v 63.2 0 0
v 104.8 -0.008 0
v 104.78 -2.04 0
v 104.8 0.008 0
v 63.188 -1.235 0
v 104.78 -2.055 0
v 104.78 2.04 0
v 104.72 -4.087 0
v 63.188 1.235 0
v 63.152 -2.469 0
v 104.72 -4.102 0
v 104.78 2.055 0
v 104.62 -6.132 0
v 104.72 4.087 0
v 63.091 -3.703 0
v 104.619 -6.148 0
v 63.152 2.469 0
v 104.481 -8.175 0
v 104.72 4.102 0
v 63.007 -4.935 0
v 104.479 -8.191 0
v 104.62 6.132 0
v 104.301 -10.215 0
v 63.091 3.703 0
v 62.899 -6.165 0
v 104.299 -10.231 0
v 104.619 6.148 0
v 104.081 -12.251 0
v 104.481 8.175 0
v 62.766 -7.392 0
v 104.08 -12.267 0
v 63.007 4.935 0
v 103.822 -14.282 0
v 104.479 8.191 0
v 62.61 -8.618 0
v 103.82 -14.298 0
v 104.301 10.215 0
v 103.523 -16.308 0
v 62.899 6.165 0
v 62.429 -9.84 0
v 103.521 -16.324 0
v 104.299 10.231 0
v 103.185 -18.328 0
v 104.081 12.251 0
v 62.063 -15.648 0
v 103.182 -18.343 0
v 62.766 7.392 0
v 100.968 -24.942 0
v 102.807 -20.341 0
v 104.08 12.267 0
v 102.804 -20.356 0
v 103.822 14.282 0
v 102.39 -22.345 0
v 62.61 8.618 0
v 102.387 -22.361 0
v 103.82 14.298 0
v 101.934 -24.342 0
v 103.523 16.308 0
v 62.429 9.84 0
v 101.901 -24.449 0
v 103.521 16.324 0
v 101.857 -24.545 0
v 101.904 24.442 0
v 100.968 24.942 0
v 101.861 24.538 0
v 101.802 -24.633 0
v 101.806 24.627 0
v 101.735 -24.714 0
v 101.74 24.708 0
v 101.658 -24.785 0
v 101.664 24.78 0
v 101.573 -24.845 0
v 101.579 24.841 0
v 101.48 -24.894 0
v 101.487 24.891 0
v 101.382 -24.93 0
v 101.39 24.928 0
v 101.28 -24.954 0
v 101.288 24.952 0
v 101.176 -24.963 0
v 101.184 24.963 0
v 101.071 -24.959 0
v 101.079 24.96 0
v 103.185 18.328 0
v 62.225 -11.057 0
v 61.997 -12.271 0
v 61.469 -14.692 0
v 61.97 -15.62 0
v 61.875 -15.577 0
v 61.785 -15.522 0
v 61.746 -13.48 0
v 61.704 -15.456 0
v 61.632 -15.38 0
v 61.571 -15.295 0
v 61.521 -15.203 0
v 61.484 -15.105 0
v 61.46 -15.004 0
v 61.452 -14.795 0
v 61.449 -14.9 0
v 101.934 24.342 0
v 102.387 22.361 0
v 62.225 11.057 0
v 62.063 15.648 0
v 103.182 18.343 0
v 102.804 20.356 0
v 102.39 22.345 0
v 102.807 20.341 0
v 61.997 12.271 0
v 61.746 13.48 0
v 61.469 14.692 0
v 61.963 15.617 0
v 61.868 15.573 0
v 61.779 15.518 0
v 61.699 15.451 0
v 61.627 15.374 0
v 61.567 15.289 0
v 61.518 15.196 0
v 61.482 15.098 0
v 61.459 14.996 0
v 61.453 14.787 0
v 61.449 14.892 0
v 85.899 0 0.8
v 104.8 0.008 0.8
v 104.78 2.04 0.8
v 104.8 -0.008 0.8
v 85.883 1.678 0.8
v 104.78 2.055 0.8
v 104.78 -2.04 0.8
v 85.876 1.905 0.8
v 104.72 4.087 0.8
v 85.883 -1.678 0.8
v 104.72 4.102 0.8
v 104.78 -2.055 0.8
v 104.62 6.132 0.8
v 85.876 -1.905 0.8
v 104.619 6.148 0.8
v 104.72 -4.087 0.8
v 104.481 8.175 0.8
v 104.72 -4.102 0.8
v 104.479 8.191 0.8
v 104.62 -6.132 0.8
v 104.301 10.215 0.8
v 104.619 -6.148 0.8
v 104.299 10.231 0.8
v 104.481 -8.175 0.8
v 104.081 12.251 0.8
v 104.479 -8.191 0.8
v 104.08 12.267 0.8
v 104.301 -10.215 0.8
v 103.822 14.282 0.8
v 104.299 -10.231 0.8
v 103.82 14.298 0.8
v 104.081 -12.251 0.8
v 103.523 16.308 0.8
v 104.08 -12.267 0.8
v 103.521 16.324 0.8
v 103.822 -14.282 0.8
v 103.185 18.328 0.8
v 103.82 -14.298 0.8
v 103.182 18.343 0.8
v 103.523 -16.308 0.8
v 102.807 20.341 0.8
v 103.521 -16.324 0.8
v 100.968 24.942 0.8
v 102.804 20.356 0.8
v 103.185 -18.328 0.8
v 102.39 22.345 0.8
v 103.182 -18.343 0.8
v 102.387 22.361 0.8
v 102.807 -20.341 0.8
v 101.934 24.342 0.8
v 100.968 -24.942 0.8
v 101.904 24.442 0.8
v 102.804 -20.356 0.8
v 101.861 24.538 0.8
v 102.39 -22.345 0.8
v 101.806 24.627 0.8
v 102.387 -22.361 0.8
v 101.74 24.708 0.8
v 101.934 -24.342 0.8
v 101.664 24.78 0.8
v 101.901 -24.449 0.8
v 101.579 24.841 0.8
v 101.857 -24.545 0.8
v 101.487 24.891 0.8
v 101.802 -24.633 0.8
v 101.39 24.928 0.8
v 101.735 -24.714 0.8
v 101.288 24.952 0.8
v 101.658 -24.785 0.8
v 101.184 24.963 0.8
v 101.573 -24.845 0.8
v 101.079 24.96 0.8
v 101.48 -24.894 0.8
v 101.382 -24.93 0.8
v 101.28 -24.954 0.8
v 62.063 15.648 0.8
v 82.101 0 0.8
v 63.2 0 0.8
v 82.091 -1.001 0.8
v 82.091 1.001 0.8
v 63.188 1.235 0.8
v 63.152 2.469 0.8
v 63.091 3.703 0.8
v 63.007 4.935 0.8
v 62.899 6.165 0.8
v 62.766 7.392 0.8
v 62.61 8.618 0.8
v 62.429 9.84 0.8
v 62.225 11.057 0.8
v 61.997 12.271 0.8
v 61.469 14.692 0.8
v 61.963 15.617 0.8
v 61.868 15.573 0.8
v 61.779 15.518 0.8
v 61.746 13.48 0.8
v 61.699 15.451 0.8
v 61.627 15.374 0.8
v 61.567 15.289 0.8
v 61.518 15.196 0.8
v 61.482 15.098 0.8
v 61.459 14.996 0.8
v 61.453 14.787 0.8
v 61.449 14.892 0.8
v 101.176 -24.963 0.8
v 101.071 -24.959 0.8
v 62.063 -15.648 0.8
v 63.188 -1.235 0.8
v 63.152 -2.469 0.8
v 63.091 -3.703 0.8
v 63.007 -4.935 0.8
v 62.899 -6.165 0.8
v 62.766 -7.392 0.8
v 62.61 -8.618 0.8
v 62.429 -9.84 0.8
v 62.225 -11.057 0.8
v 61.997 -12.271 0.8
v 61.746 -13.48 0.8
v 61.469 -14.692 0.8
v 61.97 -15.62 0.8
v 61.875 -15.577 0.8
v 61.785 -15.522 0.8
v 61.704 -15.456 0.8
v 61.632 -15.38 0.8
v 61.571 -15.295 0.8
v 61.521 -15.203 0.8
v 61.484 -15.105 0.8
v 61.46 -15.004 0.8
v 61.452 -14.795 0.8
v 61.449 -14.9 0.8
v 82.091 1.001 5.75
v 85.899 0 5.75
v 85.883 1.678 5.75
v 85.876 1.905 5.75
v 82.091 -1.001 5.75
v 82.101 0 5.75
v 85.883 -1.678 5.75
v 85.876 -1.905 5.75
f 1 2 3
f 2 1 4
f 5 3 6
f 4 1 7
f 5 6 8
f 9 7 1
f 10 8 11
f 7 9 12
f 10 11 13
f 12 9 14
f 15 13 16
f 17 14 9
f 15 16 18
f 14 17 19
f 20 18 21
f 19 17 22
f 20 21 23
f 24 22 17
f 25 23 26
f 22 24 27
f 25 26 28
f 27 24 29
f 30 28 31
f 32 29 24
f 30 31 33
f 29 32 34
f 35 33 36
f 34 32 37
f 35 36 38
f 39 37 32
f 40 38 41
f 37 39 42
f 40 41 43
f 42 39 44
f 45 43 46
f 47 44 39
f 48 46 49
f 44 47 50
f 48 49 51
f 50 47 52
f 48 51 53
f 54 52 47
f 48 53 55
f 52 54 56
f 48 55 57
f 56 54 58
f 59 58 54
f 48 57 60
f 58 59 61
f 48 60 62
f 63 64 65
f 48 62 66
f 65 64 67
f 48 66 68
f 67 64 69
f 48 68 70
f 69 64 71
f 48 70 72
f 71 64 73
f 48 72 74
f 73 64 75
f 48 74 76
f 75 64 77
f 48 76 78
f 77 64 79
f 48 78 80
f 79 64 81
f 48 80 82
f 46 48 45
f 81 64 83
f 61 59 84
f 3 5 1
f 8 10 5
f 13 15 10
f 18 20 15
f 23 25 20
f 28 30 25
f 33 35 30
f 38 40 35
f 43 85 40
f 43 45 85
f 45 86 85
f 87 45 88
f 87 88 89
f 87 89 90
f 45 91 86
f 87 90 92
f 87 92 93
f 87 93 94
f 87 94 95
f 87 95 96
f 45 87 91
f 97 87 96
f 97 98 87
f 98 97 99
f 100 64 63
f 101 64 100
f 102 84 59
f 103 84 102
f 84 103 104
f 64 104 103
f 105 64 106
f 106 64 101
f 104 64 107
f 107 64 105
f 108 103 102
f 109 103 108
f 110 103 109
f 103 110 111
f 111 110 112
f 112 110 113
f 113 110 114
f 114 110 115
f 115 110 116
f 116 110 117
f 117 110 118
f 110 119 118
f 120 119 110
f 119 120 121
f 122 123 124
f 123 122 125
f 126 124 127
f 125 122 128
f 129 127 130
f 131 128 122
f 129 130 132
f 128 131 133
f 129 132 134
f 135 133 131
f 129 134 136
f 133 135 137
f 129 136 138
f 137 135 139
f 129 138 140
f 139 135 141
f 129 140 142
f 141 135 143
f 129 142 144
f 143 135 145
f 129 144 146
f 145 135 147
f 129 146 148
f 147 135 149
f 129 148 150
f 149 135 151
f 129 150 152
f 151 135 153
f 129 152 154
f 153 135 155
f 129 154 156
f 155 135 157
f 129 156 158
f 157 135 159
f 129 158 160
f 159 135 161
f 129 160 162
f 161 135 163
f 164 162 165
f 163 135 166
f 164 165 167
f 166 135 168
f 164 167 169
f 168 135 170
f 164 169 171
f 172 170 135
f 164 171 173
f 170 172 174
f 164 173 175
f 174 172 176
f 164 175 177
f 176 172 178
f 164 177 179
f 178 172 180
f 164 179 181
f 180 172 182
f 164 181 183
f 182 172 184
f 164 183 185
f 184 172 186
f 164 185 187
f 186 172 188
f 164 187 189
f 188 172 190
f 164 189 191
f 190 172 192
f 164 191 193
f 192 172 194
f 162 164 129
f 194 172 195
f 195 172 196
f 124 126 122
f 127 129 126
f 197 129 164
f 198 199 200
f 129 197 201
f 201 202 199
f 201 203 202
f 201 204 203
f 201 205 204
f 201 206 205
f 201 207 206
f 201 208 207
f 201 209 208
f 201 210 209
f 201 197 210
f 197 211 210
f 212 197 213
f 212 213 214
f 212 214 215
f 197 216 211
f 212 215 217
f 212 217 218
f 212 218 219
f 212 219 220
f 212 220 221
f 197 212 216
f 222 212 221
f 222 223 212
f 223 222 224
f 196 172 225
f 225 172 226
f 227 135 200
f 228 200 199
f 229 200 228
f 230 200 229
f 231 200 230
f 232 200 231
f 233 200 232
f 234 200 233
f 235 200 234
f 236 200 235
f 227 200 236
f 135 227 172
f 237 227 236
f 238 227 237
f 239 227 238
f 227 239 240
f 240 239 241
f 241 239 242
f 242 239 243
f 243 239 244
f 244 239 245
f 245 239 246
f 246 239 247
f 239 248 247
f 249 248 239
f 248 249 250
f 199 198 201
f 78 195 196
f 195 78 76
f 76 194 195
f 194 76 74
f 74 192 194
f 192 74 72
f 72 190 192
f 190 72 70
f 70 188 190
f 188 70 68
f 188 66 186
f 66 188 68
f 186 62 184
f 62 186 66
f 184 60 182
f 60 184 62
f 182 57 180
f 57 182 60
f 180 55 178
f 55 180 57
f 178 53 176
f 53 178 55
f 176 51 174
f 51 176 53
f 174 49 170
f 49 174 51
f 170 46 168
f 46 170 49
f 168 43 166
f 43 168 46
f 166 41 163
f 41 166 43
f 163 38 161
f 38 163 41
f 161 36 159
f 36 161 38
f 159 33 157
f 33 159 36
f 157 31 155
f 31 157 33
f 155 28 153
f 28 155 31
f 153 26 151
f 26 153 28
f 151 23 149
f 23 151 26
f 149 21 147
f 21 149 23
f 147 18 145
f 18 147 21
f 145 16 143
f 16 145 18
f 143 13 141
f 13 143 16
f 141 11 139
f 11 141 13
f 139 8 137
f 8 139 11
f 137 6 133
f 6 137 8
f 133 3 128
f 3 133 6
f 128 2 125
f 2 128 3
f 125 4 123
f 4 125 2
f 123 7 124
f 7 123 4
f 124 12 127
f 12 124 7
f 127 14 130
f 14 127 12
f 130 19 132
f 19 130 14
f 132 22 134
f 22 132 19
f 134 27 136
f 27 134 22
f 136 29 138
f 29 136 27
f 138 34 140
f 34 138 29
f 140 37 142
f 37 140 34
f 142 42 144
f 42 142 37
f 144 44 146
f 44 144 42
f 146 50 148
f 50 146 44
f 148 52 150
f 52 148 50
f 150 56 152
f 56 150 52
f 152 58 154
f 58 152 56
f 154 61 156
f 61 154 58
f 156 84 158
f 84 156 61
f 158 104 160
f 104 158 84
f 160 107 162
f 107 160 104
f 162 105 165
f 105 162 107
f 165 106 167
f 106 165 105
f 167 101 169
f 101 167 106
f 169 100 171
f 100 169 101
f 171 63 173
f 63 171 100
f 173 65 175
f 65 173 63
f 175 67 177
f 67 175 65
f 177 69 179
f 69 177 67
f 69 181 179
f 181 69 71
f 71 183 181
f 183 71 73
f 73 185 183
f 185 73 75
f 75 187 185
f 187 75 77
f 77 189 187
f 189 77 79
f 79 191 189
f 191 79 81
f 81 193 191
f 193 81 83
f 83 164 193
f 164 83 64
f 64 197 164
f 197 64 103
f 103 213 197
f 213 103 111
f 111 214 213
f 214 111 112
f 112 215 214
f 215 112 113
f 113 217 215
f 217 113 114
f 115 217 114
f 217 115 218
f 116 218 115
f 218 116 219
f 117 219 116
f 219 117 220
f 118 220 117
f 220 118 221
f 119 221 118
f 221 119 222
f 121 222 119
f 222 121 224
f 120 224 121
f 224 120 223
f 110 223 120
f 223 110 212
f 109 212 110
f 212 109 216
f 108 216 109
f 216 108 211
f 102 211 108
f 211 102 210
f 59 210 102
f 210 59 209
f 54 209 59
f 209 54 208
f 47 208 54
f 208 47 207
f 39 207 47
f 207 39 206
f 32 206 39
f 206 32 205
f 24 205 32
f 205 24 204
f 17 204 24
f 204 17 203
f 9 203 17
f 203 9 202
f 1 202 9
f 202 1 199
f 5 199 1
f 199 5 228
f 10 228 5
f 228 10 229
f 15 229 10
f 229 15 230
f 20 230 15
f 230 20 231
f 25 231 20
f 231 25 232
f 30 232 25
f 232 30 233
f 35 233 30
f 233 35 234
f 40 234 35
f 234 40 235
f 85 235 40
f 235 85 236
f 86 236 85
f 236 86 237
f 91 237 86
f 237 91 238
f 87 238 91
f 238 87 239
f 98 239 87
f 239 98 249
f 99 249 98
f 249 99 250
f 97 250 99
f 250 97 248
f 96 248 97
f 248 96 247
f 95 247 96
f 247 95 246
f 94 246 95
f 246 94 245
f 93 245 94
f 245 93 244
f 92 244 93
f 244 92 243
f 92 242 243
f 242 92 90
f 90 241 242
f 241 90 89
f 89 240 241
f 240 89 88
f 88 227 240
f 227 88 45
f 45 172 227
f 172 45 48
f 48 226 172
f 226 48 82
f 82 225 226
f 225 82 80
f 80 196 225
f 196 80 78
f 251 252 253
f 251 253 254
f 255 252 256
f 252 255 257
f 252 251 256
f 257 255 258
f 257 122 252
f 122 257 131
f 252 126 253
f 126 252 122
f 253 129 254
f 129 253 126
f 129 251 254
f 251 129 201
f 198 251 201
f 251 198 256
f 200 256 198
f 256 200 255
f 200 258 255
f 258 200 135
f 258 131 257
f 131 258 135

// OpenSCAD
// file: parameters.scad
// =============================================================================
// Gen-CA — nightly 2026-10-13 (physics_scorer, honest magpylib watts)
// Break the plate limit instead of the physics: the 2026-10-11 scans showed watts keep rising with machine size, but Ø194 was the largest one-piece stator/rotor set that fits one 410 mm plate. Gen-CA makes the steel disc the structural rotor and prints the magnet carrier as 8 bolt-on arcs per rotor plus a separate D-flat hub, opens the stator centre, and prints the 12 bobbin bases in place inside their stator bays, so a much bigger R84 / Ø226 machine (bobbins r64–104, 4.95 mm copper, 7.55 mm magnet gap) still packs on ONE plate.
// Clocking 0 deg (magnets N facing S) + D-flat keyed bore + index notch + flip-symmetric hole map.
// Windable 2-piece bobbin; turns = physics_scorer turns_fit; copper only between flanges.
// Steel back-iron: 2× Ø194 × 4.76 mm (3/16") mild-steel discs (steel_backiron_disc.dxf); magnets sit ON the steel
// (through-pockets) -> score with --back-iron. Night 2026-10-13.
// =============================================================================
topology            = "dual_rotor";

// --- Wire / winding (physics_scorer winding-fit) -------------------------------
wire_awg            = 26;
wire_od             = 0.45;     // insulated OD mm (bare 0.405)
fill_realistic      = 0.65;     // insulated-wire area / window (DENSE layered wind with a jig; scorer cap 0.65)
turns               = 366;       // = physics_scorer turns_fit (do NOT raise)
coil_former_type    = "bobbin";
coil_core_inset     = 18.10;     // radial copper build: hub = copper boundary inset by this
wind_build_axial    = 0.0;      // nothing proud of the flanges
wind_build_radial   = 0.0;

// --- Bobbin (base + lid) ---------------------------------------------------------
coil_id_r           = 64.00;    // copper boundary sector
coil_od_r           = 104.00;
span_deg            = 26.87;    // = pitch - 2*asin((wall+0.85)/coil_id_r) -> >=1.2 mm stator web
former_web          = 4.95;     // copper height between flanges (TALL copper: steel keeps Bz up)
flange_t            = 0.80;     // >= 0.8 mm FDM wall rule (tall winds push on the flanges)
wall                = 0.80;     // flange lip beyond copper
former_bare_h       = former_web + 2 * flange_t;
coil_envelope_h     = former_bare_h + 2 * wind_build_axial;
tab_w               = 7.0;
tab_len             = 7.0;
tab_h               = former_bare_h / 2;
pin_d               = 1.9;      // 1.75 mm filament locating pin
coil_mount_r        = coil_od_r + 0.2 + 4.0;
lead_y              = 1.6;
lead_slot_w         = 0.9;
lead_groove_d       = 0.6;

// --- Gap -------------------------------------------------------------------------
run_clear           = 0.50;     // rotor face -> flange
gap_spacer_h        = run_clear + wind_build_axial;
m2m                 = coil_envelope_h + 2 * run_clear;   // rotor face to rotor face (= gap_sleeve length)

// --- Stator ----------------------------------------------------------------------
coil_stations       = 12;
bay_clear           = 0.35;     // 0.35 mm: bobbin BASES print IN PLACE inside the stator bays (print-in-place gap), then pop out
stator_thick        = former_bare_h;                        // bobbins flush both faces
stator_od           = 226;
shaft_clear_stator  = 14.0;     // stator is static; gap sleeve OD 12 spins inside
stator_ir           = 58.85;    // ANNULAR stator: open centre (nested one-plate pack); inner rim 4.0 mm

// --- Rotor(s) --------------------------------------------------------------------
magnet_Br           = 1.43;     // N52
magnet_d_large      = 20.0;
magnet_h_large      = 5.0;      // one O20x5 per pocket
magnet_h_small      = 5.0;      // unused: no O5 pockets in this kit
halbach_magnetisation = "none";  // NO O5 assist magnets in this kit (scan: they lower the 4-pole score)
rotor_b_same_axis   = true;     // same-index magnets share one axis: N faces S across the gap
large_pocket_d      = 20.3;
small_pocket_d      = 5.3;
pocket_h            = 5.00;     // THROUGH the carrier: magnet back face sits on the steel disc (FLUSH seat: carrier = magnet height, magnet face level with the rotor face)
large_n             = 8;
R_large             = 84.0;
small_r_list        = [];       // no O5 pockets
carrier_od          = 194.0;
ring_ir             = 70.85;    // RING rotor: PLA magnet ring r ring_ir..carrier_od/2 (steel disc = structural rotor)
hub_flange_od       = 74.0;     // separate rotor_hub flange (inside the ring, flush with the ring face)
csk_d               = 6.6;      // M3 countersunk head pocket (ISO 10642 head 6.0 nominal) on the stator face
csk_depth           = 1.55;     // = (csk_d - m3_clear) / 2: 90 deg cone; head sits 0.3 mm below the face
n_seg               = 8;        // magnet-carrier ARCS per rotor (segmented carrier)
seg_deg             = 360 / n_seg;
seg_start           = -22.5;   // arc edge angle (between pocket 0 and its clamp bolt)
seg_kerf_deg        = 0.4;      // gap between neighbouring arcs on the steel
carrier_thick       = pocket_h;
hub_h               = 12.0;     // > steel_t + insert: radial set-screw clears the steel
hub_od              = 24.0;     // slim hub so the M4 brace rods fit at R~18 inside the coil ring
hub_insert_d        = 4.0;      // M3 heat-set insert, radial, bears on the D-flat
rotor_b_offset_deg  = 0.0;      // CLOCKING: magnets directly opposite
shaft_key           = "dflat";
dflat_depth         = 0.5;      // 8 mm shaft with 0.5 mm flat (7.5 across flat)
index_notch_d       = 3.0;

// --- Steel back-iron (buyable laser-cut) -------------------------------------------
steel_t             = 4.76;      // mild steel thickness (image method ignores it; sized from steel_flux.py so the return path stays well below saturation)
steel_center_hole   = 26.0;     // slips over the rotor hub (OD 24)
steel_od            = carrier_od;   // steel disc OD = rotor carrier OD

// --- Modular MAX interface ----------------------------------------------------------
shaft_bore          = 8.35;
dflat_x             = 4.0 - dflat_depth + (shaft_bore - 8.0) / 2;
bearing_d           = 21.85;
bearing_h           = 7.2;
m3_clear            = 3.5;
bolt_r_inner        = 30.0;     // M3 steel-disc clamp bolts (inside the magnet ring)
bolt_n_inner        = 4;
bolt_inner_angles   = [0, 90, 180, 270];
bolt_r_outer        = 84.0;     // second M3 steel-disc clamp ring
bolt_outer_angles   = [22.5, 67.5, 112.5, 157.5, 202.5, 247.5, 292.5, 337.5];
flange_bolt_r       = 107.5;     // frame rods: OUTSIDE the rotor OD (rotors spin inside them)
flange_bolt_n       = 4;
flange_bolt_offset  = 45.00;    // between coil stations -> never cuts a lead groove/tab
brace_r             = 18.0;
brace_d             = 4.3;      // temporary M4 jack rods (assembly only)
brace_n             = 4;
brace_angles        = [45, 135, 225, 315];          // flip-symmetric

spacer_pad_od       = 14.0;
spacer_pad_id       = m3_clear;
endbell_od          = 225.0;
endbell_thick       = 8.0;
endbell_shaft_clear = 10.0;
collar_h            = 10.0;
standoff_od         = 9.0;
frame_standoff_h    = run_clear + carrier_thick + hub_h + collar_h + 2.0;
sleeve_od           = 12.0;
plate_max_mm        = 410;

$fn = 64;
// main file
// Gen-CA — bobbin BASE (bottom flange + hub). Print x12, flange down. Wind 26 AWG x 366 t around
// the hub with the LID glued on (coil_lid.stl). Copper lives ONLY between the flanges (no proud winds).
include <parameters.scad>;
$fn = 48;
module sector_2d(r_in, r_out, ang) {
    polygon([
        for (a = [-ang/2 : ang/24 : ang/2]) [r_in*cos(a), r_in*sin(a)],
        for (a = [ang/2 : -ang/24 : -ang/2]) [r_out*cos(a), r_out*sin(a)]
    ]);
}
module footprint_2d() { offset(r=wall) sector_2d(coil_id_r, coil_od_r, span_deg); }
module hub_2d()       { offset(delta=-coil_core_inset) sector_2d(coil_id_r, coil_od_r, span_deg); }

union() {
    linear_extrude(flange_t) footprint_2d();
    translate([0, 0, flange_t - 0.01]) linear_extrude(former_web + 0.01) hub_2d();
}
